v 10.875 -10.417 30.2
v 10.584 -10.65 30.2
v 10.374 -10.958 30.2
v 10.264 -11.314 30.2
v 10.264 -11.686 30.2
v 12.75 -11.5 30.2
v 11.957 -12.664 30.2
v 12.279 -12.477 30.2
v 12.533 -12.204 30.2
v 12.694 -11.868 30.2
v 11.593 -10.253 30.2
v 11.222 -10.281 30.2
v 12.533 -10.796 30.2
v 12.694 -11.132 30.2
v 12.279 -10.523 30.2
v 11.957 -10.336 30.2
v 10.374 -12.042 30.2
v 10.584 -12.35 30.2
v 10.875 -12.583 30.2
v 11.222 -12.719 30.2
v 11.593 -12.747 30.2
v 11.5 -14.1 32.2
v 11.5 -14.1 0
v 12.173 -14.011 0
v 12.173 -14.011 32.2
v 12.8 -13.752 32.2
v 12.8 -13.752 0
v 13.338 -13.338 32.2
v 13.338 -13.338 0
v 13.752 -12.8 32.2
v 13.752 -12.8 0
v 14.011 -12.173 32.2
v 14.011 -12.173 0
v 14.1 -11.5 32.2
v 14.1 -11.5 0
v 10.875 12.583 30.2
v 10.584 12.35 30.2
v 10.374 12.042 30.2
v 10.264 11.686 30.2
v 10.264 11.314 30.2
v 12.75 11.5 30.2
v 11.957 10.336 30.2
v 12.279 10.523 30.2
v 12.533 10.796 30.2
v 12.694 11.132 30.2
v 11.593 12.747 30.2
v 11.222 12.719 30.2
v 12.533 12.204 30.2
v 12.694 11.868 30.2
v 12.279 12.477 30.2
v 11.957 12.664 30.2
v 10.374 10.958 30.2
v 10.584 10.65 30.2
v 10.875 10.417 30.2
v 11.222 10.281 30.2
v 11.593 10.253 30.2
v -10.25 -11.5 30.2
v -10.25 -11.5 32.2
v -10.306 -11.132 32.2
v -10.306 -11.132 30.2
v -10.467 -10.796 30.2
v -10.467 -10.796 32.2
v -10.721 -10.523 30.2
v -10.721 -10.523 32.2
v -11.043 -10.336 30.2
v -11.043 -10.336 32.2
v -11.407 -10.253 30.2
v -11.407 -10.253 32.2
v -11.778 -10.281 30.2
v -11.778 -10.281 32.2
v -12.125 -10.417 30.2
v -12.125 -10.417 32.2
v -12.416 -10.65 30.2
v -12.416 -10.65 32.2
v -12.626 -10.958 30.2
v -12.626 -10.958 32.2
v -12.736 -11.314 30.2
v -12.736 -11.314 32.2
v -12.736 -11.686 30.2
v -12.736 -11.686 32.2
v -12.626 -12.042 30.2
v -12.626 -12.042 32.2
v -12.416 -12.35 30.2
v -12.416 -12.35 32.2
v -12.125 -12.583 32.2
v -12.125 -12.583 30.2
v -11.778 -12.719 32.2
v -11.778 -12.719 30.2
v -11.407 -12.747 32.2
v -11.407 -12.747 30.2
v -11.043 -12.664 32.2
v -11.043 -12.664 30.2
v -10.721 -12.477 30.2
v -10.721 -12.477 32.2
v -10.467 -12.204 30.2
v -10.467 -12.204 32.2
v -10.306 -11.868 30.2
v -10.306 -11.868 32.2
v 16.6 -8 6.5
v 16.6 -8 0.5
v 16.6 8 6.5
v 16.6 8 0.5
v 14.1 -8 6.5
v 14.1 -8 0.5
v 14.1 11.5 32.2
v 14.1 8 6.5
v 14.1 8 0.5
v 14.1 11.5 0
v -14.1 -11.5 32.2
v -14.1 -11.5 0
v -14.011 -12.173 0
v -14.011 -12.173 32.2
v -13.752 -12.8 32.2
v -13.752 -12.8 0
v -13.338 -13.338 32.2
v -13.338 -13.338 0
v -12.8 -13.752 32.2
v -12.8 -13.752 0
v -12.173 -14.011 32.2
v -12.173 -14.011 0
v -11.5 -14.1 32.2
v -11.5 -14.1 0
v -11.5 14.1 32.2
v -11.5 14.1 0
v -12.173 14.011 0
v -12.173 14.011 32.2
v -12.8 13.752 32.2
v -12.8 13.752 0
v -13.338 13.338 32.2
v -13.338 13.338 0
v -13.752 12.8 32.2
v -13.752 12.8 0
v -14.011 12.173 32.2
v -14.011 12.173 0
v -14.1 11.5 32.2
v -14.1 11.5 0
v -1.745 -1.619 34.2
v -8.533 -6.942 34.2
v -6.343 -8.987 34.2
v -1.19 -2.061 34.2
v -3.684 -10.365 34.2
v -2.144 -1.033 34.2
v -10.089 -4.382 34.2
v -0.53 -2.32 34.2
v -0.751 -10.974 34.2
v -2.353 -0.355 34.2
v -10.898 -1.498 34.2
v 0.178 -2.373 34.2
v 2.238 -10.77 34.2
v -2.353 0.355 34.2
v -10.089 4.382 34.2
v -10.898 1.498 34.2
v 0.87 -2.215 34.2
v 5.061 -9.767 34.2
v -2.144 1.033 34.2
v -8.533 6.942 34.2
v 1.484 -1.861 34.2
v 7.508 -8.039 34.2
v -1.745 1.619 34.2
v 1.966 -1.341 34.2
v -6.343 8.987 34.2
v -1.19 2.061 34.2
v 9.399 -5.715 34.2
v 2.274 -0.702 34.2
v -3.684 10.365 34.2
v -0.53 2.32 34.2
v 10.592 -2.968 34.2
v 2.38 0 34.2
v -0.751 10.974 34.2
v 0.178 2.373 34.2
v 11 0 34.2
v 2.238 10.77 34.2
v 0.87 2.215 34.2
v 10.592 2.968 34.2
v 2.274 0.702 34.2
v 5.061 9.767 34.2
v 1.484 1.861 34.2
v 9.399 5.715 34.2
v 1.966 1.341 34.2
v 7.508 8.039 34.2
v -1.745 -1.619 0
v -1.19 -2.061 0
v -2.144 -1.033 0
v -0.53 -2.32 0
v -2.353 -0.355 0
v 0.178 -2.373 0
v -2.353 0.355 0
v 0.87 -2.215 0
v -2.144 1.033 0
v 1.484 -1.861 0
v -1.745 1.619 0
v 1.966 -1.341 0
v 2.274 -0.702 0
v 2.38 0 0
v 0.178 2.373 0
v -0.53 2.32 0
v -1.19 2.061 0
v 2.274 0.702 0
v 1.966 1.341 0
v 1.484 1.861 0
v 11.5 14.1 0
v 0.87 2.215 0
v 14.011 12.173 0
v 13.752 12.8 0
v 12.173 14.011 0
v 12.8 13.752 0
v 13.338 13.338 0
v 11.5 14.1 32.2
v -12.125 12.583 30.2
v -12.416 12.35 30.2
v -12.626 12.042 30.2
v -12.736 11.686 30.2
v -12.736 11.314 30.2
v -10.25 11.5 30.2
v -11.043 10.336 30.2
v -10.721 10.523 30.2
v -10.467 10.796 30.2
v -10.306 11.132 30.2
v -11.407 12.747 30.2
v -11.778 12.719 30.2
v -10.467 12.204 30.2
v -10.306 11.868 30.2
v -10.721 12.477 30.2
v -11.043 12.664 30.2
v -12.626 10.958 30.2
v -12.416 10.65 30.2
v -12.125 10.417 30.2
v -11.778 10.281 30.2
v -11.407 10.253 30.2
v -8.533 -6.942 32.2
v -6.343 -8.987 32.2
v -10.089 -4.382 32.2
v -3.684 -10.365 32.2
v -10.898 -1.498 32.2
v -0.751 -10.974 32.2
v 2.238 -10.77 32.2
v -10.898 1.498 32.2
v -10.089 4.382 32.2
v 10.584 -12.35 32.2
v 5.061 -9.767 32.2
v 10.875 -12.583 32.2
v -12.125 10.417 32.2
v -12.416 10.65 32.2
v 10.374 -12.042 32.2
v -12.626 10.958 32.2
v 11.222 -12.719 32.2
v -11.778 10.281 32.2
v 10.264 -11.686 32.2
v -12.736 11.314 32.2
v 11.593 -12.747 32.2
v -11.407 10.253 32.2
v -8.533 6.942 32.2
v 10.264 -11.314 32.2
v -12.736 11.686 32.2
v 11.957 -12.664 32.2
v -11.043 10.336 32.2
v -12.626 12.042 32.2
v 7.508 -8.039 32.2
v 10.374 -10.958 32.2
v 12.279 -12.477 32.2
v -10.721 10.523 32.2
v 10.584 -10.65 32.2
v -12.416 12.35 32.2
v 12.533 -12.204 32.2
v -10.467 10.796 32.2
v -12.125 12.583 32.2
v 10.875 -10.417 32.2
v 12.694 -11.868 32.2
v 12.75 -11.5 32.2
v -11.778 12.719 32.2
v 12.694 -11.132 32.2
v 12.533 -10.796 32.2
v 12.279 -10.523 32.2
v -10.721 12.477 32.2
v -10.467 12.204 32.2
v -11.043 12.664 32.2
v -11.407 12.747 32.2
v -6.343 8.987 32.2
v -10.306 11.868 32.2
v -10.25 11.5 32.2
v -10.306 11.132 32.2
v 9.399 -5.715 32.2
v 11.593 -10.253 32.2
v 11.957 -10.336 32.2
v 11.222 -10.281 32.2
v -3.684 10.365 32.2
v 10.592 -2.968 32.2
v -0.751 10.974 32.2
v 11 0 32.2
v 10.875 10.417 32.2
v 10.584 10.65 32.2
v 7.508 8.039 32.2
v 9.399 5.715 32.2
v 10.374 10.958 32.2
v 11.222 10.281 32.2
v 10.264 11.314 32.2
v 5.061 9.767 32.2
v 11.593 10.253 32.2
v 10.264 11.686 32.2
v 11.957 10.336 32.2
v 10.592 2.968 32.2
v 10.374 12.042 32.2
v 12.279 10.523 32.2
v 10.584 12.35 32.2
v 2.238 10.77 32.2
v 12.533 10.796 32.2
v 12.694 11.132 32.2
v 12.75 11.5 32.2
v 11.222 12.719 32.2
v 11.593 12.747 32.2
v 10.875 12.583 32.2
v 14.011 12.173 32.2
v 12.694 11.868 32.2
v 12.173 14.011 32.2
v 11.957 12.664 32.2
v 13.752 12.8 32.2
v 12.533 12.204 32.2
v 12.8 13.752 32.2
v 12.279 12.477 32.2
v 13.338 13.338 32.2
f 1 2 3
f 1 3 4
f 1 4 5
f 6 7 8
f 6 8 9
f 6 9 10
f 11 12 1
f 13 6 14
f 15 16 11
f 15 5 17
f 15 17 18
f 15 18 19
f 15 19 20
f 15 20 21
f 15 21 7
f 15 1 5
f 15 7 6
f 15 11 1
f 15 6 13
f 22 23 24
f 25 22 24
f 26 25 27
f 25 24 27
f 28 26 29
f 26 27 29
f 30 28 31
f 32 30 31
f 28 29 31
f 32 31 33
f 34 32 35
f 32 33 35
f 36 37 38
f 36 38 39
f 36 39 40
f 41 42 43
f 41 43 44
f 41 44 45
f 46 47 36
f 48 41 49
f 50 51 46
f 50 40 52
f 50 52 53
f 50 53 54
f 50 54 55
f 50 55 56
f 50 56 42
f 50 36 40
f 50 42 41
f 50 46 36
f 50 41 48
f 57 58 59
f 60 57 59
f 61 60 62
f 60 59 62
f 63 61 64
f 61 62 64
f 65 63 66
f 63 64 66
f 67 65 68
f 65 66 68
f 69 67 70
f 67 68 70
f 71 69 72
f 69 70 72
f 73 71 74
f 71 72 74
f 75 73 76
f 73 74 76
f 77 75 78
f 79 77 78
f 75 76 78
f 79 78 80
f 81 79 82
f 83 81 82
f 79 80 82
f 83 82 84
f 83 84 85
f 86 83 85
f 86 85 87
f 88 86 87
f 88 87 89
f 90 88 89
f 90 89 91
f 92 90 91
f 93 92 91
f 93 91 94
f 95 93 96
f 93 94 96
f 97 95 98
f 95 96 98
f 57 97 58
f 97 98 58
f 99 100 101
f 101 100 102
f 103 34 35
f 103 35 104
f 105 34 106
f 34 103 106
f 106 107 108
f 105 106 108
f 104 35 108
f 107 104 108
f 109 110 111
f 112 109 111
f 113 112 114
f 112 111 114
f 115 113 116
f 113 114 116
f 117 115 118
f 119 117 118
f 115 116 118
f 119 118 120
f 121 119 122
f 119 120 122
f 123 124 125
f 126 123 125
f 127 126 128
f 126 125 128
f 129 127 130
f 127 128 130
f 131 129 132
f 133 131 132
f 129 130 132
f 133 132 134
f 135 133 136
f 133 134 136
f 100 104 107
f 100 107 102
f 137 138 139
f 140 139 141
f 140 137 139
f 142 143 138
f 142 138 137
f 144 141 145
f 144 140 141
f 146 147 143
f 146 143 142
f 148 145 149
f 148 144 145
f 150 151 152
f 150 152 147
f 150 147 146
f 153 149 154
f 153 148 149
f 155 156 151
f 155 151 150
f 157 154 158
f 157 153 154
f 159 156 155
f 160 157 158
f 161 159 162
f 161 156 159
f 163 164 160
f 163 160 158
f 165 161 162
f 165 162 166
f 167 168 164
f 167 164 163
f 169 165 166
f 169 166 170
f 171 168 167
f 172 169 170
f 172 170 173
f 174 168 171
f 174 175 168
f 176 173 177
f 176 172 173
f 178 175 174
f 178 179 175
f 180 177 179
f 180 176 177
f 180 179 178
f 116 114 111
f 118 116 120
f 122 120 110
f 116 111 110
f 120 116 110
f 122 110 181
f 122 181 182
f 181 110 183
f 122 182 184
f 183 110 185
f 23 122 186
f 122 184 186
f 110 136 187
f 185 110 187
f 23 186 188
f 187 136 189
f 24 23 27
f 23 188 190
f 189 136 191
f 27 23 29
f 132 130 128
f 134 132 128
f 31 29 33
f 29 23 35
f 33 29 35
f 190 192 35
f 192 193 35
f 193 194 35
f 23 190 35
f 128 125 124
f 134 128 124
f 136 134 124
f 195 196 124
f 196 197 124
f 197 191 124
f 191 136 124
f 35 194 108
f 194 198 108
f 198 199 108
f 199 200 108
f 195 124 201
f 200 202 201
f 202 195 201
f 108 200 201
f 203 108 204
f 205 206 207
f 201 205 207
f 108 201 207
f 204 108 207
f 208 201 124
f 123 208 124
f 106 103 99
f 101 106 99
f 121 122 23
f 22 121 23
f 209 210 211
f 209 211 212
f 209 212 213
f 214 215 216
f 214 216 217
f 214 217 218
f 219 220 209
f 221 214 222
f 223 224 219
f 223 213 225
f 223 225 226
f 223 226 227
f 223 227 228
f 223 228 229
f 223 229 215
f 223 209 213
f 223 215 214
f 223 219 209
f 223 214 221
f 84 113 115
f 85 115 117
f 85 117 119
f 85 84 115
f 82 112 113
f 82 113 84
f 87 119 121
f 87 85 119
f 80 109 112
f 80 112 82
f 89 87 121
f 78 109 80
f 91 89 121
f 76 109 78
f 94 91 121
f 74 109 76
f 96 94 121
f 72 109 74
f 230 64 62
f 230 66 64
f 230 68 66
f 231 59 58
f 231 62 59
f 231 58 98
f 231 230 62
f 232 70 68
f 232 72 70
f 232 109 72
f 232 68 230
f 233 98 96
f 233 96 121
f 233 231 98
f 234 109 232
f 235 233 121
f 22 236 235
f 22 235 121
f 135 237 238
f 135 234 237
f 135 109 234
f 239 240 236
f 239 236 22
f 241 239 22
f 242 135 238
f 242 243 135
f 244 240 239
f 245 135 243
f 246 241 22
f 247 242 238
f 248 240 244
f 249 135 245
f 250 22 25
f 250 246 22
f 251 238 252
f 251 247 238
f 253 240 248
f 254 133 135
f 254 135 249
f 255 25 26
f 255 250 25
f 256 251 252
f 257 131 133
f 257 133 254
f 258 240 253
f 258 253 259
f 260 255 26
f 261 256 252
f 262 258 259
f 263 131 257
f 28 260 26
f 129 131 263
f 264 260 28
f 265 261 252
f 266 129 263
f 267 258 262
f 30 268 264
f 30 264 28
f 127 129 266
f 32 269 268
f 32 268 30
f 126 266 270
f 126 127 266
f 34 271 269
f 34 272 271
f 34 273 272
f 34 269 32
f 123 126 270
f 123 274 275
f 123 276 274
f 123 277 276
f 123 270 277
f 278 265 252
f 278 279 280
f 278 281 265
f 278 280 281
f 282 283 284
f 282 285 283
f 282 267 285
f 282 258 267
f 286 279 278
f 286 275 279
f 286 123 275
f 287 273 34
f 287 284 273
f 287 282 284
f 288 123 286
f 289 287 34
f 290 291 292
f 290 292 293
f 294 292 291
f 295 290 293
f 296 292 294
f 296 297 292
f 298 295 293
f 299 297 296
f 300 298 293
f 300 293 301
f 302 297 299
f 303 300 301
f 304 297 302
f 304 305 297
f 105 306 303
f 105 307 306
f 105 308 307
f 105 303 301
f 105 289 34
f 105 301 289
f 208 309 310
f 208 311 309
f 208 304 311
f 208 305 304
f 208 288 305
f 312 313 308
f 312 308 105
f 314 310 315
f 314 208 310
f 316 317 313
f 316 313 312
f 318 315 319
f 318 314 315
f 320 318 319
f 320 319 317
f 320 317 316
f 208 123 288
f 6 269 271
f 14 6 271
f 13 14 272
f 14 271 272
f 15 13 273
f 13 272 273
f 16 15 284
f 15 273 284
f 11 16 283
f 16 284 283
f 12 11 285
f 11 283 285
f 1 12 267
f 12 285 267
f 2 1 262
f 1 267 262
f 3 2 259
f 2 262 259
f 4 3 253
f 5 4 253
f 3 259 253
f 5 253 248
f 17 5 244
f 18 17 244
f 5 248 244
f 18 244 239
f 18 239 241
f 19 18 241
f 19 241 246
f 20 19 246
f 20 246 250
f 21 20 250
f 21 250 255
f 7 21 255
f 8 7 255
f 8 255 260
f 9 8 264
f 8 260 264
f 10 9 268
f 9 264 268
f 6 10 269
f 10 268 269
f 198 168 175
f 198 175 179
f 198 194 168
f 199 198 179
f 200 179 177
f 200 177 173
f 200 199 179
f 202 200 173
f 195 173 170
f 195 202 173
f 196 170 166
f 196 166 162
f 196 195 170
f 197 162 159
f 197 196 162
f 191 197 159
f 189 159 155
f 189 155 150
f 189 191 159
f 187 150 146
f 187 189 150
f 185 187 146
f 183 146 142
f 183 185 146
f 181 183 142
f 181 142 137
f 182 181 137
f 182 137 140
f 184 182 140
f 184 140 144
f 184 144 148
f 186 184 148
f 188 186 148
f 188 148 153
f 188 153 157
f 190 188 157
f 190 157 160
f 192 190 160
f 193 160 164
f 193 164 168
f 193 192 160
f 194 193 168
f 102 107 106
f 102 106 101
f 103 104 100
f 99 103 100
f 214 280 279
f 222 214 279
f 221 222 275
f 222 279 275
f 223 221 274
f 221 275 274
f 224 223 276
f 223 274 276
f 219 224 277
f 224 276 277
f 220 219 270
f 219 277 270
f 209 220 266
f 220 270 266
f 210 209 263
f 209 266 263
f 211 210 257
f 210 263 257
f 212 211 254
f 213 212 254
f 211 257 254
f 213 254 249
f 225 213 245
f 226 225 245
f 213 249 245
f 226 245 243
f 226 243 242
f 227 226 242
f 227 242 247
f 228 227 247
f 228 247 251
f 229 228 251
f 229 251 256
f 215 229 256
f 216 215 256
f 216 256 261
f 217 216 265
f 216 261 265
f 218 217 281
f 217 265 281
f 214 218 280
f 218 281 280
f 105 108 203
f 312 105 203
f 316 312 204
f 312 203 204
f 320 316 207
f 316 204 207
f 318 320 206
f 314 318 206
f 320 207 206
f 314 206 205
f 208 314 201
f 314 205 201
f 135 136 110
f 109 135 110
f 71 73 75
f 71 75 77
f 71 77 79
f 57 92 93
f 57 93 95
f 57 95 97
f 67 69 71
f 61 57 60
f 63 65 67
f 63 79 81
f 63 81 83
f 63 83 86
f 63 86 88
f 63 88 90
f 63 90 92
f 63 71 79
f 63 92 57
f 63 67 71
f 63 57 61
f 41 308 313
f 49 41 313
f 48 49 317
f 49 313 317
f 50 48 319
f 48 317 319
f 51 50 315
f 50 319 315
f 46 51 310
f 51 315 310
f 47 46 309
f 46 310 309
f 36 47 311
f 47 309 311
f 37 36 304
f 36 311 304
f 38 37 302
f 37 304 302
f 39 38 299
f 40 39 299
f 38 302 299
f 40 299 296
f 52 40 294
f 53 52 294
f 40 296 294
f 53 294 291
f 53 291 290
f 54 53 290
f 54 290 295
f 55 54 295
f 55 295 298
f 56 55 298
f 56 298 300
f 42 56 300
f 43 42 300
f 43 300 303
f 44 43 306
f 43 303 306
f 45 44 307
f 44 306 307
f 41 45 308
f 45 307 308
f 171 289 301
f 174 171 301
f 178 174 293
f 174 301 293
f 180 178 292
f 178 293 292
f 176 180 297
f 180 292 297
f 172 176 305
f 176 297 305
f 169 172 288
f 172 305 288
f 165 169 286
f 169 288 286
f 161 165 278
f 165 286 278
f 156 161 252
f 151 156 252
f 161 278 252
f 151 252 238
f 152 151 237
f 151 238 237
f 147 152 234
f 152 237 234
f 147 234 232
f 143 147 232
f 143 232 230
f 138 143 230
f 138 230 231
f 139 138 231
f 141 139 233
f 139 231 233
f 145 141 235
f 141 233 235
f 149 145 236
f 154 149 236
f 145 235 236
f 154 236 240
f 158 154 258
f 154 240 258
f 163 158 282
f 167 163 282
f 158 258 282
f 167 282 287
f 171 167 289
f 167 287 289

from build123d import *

# Parameters (mm, degrees)
SKETCH1_R           = 2.38
BOSS_EXTRUDE1_DEPTH = 32.2
BOSS_EXTRUDE2_START = 0.5
SKETCH1_3_W         = 2.5
SKETCH1_3_H         = 16
BOSS_EXTRUDE2_DEPTH = 6
CUT_EXTRUDE1_START  = 32.2
SKETCH1_4_R         = 1.25
CUT_EXTRUDE1_DEPTH  = 2
BOSS_EXTRUDE3_START = 32.2
SKETCH1_5_R         = 11
SKETCH1_5_R_2       = 2.38
BOSS_EXTRUDE3_DEPTH = 2


with BuildPart() as part:
    # Sketch1 → Boss-Extrude1 (new body)
    with BuildSketch(Plane.XY):
        with BuildLine():
            Line((11.5, 14.1), (-11.5, 14.1))
            ThreePointArc((-11.5, 14.1), (-13.338477631, 13.338477631), (-14.1, 11.5))
            Line((-14.1, 11.5), (-14.1, -11.5))
            ThreePointArc((-14.1, -11.5), (-13.338477631, -13.338477631), (-11.5, -14.1))
            Line((-11.5, -14.1), (11.5, -14.1))
            ThreePointArc((11.5, -14.1), (13.338477631, -13.338477631), (14.1, -11.5))
            Line((14.1, -11.5), (14.1, 11.5))
            ThreePointArc((14.1, 11.5), (13.338477631, 13.338477631), (11.5, 14.1))
        make_face()
        Circle(SKETCH1_R, mode=Mode.SUBTRACT)
    extrude(amount=BOSS_EXTRUDE1_DEPTH)

    # Sketch1<3> → Boss-Extrude2 (add)
    with BuildSketch(Plane.XY.offset(BOSS_EXTRUDE2_START)):
        with Locations((15.35, 0)):
            Rectangle(SKETCH1_3_W, SKETCH1_3_H)
    extrude(amount=BOSS_EXTRUDE2_DEPTH)

    # Sketch1<4> → Cut-Extrude1 (cut)
    with BuildSketch(Plane.XY.offset(CUT_EXTRUDE1_START)):
        with Locations((-11.5, 11.5)):
            Circle(SKETCH1_4_R)
        with Locations((11.5, 11.5)):
            Circle(SKETCH1_4_R)
        with Locations((11.5, -11.5)):
            Circle(SKETCH1_4_R)
        with Locations((-11.5, -11.5)):
            Circle(SKETCH1_4_R)
    extrude(amount=-CUT_EXTRUDE1_DEPTH, mode=Mode.SUBTRACT)

    # Sketch1<5> → Boss-Extrude3 (add)
    with BuildSketch(Plane.XY.offset(BOSS_EXTRUDE3_START)):
        Circle(SKETCH1_5_R)
        Circle(SKETCH1_5_R_2, mode=Mode.SUBTRACT)
    extrude(amount=BOSS_EXTRUDE3_DEPTH)


solid = part.part
